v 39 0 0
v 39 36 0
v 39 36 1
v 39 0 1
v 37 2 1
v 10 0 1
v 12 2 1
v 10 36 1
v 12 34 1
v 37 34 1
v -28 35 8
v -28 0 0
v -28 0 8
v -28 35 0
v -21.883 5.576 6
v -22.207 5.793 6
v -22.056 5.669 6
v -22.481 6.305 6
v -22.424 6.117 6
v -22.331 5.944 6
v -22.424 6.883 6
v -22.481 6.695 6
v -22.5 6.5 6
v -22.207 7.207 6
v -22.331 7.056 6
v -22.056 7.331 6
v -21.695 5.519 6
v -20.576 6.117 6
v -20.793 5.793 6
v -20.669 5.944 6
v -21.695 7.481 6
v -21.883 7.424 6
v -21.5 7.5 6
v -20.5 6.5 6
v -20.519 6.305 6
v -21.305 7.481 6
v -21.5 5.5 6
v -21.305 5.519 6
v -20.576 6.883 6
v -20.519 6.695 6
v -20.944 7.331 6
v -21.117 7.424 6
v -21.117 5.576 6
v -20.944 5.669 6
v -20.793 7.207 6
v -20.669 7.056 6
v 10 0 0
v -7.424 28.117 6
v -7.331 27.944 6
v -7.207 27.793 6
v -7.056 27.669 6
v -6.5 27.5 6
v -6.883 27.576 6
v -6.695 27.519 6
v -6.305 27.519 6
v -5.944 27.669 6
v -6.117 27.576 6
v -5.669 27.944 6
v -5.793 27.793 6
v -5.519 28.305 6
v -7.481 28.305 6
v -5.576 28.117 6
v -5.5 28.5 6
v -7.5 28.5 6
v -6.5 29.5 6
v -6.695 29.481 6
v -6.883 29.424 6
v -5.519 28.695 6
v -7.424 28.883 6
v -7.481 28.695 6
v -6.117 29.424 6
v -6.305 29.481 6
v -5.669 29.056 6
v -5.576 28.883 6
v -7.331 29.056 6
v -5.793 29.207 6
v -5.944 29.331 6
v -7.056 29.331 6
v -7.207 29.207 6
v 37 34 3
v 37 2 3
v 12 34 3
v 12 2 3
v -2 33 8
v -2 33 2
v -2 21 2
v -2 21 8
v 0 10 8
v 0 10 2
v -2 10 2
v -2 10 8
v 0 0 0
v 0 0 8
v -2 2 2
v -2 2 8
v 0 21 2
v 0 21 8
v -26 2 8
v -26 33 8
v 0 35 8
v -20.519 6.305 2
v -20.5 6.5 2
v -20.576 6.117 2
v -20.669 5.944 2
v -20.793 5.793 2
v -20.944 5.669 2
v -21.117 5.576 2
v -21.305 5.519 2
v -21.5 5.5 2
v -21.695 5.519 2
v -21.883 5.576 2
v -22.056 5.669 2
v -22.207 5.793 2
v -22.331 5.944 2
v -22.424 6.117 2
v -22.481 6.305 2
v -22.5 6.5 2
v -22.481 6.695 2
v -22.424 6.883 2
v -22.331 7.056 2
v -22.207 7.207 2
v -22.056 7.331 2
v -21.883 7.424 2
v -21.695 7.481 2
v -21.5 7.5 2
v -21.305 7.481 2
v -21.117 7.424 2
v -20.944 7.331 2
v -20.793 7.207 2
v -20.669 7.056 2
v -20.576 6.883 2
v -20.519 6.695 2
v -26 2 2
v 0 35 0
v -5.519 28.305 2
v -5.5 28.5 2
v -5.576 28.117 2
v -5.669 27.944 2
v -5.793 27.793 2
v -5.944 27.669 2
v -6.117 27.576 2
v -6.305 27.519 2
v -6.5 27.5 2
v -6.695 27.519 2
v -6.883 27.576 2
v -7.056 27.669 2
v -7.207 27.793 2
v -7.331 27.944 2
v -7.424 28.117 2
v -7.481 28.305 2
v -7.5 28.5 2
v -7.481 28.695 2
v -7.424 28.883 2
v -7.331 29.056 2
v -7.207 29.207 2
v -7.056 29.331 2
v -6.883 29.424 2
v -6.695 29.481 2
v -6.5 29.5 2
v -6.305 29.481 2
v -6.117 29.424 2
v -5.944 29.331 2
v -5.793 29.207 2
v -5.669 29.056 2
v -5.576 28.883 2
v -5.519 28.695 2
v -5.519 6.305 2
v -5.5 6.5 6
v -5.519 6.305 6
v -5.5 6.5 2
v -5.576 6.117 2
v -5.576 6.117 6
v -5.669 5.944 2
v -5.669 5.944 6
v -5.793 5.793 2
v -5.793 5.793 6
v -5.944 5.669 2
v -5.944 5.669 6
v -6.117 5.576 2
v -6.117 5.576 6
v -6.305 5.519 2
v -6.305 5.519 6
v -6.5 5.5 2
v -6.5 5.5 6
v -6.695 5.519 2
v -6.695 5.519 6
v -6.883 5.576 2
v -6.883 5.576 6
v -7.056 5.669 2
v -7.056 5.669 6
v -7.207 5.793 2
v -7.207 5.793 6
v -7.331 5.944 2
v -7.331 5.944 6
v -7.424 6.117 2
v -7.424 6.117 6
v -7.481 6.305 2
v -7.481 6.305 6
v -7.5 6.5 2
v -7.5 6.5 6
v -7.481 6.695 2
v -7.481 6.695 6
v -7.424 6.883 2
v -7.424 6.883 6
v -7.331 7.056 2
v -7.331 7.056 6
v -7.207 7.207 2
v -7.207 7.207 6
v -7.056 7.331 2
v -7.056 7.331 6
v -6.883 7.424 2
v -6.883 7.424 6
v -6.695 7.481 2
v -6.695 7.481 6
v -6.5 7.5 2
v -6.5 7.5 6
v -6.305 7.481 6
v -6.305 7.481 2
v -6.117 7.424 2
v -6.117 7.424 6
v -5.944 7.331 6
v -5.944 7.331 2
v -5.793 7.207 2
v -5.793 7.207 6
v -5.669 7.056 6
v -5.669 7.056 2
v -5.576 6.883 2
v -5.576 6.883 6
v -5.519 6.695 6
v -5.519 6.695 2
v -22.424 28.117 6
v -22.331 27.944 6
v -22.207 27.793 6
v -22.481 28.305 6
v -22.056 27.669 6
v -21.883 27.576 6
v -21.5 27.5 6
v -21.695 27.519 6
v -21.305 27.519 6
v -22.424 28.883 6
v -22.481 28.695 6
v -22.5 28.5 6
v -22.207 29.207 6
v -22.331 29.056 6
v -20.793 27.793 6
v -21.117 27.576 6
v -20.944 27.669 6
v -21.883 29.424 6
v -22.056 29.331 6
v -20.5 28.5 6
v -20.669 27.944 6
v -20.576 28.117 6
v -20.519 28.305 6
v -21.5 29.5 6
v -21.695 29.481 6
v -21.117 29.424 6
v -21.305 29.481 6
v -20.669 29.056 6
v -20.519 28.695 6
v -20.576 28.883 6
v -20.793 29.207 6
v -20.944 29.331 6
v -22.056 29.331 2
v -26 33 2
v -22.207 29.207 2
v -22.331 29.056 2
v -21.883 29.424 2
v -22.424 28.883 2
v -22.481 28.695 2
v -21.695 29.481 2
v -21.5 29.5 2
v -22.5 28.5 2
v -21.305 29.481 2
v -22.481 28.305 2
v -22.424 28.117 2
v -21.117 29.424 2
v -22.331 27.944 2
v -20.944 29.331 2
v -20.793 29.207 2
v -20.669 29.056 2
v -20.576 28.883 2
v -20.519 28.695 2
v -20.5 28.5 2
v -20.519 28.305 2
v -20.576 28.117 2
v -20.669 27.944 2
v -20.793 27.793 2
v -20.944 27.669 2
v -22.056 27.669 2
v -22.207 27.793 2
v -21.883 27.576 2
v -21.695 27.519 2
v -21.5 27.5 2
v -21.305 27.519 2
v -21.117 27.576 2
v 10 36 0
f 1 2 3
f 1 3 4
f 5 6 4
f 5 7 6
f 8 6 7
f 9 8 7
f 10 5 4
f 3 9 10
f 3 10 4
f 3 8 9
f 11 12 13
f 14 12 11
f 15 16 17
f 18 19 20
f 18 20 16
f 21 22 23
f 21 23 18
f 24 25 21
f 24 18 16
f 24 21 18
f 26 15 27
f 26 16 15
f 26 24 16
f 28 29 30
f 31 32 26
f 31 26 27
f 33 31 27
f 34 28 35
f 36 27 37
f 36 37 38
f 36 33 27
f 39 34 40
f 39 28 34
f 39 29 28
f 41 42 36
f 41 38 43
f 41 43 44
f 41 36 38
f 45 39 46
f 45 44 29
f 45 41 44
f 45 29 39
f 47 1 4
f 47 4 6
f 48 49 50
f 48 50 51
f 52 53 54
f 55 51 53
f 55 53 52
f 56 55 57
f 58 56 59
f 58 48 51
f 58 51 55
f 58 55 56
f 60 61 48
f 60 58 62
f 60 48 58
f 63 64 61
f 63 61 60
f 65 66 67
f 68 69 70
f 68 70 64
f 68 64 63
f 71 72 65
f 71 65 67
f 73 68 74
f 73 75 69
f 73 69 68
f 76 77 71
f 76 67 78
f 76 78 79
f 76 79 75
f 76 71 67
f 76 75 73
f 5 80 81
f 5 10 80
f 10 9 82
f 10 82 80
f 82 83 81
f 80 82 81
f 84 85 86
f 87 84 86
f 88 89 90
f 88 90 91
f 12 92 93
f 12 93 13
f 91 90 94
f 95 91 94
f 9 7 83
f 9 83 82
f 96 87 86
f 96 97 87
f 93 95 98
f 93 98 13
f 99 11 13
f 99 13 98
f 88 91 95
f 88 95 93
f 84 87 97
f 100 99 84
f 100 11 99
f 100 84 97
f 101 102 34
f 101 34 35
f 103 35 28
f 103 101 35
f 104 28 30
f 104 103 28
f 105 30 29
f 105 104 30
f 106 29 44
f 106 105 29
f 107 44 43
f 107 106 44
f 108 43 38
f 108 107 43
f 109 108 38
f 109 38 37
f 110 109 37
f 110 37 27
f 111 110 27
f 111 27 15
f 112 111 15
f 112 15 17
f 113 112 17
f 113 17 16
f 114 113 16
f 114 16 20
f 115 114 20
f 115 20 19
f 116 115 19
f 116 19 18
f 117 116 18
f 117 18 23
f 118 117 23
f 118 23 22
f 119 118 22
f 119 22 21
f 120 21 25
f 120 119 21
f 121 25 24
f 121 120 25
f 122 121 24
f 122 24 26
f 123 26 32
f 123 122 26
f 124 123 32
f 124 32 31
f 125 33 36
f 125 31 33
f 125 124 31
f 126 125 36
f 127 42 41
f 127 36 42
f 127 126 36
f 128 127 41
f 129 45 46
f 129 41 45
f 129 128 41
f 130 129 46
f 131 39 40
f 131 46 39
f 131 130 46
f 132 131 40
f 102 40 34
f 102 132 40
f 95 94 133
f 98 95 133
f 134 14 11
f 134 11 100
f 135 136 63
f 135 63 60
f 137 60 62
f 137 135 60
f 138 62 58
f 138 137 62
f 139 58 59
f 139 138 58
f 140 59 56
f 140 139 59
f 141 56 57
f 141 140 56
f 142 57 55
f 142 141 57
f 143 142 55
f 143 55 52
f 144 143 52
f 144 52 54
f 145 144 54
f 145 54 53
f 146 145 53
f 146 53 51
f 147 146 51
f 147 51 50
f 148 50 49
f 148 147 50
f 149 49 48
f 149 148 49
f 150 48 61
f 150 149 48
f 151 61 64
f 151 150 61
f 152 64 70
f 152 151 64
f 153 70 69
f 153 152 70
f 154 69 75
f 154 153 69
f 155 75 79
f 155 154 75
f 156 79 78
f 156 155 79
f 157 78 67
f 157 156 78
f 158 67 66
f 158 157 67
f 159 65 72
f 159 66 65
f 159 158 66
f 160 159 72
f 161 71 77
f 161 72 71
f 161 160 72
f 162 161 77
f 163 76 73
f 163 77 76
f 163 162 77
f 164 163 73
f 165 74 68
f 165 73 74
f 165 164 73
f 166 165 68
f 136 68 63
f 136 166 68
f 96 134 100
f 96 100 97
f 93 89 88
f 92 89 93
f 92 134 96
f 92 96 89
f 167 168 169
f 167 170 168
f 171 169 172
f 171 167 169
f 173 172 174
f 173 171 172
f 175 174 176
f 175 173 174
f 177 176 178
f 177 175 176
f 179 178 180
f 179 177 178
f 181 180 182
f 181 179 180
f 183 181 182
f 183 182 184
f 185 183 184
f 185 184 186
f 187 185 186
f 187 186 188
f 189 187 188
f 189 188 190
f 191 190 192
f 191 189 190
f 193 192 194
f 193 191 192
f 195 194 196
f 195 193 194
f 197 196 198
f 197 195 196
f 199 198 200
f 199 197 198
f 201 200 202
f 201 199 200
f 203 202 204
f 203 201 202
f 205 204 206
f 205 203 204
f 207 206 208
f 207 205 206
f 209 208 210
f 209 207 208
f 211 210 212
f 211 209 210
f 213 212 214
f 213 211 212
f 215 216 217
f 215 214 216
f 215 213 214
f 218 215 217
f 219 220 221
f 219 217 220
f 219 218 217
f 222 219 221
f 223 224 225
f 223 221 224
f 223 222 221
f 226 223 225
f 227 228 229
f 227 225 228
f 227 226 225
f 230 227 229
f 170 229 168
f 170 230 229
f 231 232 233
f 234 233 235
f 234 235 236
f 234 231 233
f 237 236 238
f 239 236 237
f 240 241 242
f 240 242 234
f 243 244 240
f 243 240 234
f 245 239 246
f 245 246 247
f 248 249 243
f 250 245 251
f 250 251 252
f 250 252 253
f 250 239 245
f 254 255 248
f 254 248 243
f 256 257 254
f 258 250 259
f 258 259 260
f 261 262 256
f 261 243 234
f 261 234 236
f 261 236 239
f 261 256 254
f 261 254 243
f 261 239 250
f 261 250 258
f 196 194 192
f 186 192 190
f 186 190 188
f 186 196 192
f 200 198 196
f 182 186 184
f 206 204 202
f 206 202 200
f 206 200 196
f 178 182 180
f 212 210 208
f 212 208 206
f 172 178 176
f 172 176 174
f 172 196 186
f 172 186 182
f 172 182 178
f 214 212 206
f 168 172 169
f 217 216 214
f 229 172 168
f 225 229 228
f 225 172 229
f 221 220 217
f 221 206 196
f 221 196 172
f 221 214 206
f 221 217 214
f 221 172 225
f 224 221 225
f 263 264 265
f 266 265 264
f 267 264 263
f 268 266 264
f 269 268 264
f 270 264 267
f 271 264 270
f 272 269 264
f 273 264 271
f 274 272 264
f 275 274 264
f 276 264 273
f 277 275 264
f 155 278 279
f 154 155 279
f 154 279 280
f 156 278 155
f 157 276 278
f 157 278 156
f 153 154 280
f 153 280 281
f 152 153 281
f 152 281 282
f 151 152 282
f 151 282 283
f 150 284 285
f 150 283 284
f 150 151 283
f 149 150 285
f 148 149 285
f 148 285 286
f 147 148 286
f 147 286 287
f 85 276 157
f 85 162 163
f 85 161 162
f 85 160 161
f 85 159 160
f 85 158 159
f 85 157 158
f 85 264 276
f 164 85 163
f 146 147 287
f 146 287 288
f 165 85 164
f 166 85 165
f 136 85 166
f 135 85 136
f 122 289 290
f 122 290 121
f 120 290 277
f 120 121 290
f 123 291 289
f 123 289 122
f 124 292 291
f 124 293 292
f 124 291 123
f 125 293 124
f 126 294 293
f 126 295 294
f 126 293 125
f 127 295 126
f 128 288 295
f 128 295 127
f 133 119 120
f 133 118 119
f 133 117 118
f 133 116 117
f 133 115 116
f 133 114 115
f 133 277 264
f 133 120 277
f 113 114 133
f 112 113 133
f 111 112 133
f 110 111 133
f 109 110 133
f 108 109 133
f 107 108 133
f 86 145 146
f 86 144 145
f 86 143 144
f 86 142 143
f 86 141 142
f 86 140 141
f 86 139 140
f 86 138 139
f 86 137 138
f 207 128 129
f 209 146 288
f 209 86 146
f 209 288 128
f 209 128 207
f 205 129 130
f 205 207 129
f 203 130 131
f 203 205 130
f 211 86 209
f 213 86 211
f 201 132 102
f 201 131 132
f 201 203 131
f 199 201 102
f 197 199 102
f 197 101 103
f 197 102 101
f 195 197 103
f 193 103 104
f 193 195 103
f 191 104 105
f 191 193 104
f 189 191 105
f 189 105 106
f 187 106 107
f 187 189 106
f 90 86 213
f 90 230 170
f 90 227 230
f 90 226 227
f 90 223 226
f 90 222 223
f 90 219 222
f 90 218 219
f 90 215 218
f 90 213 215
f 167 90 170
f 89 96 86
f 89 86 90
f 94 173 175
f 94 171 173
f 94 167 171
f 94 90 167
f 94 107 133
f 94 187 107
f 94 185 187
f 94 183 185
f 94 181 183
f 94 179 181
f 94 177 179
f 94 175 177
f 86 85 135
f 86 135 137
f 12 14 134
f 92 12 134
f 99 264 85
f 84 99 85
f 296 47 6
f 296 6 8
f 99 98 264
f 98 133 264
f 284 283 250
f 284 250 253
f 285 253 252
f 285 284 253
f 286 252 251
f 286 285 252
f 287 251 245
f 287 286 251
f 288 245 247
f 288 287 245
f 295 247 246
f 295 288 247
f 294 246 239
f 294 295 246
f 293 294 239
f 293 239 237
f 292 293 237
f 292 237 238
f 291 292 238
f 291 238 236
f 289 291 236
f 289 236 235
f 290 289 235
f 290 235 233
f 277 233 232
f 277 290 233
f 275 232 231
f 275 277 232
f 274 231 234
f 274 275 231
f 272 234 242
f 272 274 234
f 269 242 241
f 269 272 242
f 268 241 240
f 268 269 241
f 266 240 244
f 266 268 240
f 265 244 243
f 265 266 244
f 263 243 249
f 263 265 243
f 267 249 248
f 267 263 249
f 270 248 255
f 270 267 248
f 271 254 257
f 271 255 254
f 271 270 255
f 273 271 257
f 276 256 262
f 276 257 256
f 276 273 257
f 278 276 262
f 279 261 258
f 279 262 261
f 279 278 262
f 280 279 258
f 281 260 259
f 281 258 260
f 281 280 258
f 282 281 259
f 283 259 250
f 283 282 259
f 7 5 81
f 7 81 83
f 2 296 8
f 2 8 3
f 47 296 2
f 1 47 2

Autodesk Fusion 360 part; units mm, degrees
sketch "Sketch1" plane through (0, 0, 0) normal (0, 0, 1) x (1, 0, 0)
  line L0 (-28, 35) -> (0, 35)
  line L1 (0, 35) -> (0, 0)
  line L2 (0, 0) -> (-28, 0)
  line L3 (-28, 0) -> (-28, 35)
  circle A0 centre (-21.5, 28.5) radius 1
  circle A1 centre (-6.5, 28.5) radius 1
  circle A2 centre (-21.5, 6.5) radius 1
  circle A3 centre (-6.5, 6.5) radius 1
  line L4 (-32, 28.5) -> (12, 28.5) construction
  line L5 (-6.5, 33) -> (-6.5, -2) construction
  line L6 (-28, 6.5) -> (6, 6.5) construction
  line L7 (-21.5, 33) -> (-21.5, -2) construction
  line L8 (-26, 33) -> (-2, 33)
  line L9 (-2, 33) -> (-2, 2)
  line L10 (-2, 2) -> (-26, 2)
  line L11 (-26, 2) -> (-26, 33)
  point P0 (-21.5, 25)
  dimension "d1" = 35
  dimension "d2" = 28
  dimension "d3" = 2
  dimension "d4" = 15
  dimension "d5" = 22
  dimension "d7" = 6.5
  dimension "d8" = 6.5
  dimension "d13" = 2
  dimension "d14" = 2
  dimension "d15" = 2
  dimension "d16" = 2
extrude "Extrude1" add sketch "Sketch1" along normal blind 2 contours L0 L1 L2 L3 | L8 L9 L10 L11 makes body 1
extrude "Extrude2" add sketch "Sketch1" along normal blind 6 contours A0 | A1 | A2 | A3 bodies 1
extrude "Extrude3" cut sketch "Sketch1" along normal blind 8 contours L0 L1 L2 L3 bodies 1
extrude "Extrude4" add sketch "Sketch1" along normal blind 8 contours L0 L1 L2 L3 bodies 1
sketch "Sketch3" plane through (0, 0, 0) normal (0, 0, 1) x (1, 0, 0)
  line L0 (10, 36) -> (39, 36)
  line L1 (39, 36) -> (39, 0)
  line L2 (39, 0) -> (10, 0)
  line L3 (10, 0) -> (10, 36)
  line L4 (12, 34) -> (37, 34)
  line L5 (37, 34) -> (37, 2)
  line L6 (37, 2) -> (12, 2)
  line L7 (12, 2) -> (12, 34)
  line L8 (-40, 0) -> (50, 0) construction
  point P0 (-28, 0)
  dimension "d21" = 29
  dimension "d22" = 36
  dimension "d23" = 2
  dimension "d24" = 2
  dimension "d25" = 2
  dimension "d26" = 2
extrude "Extrude5" add sketch "Sketch3" along normal blind 1 separate body makes body 2
extrude "Extrude6" add sketch "Sketch3" along normal blind 3 contours L4 L5 L6 L7 bodies 2
sketch "Sketch4" plane through (0, 0, 0) normal (1, 0, 0) x (0, 1, 0)
  line L0 (0, 0) -> (35, 0)
  line L1 (35, 0) -> (35, 8)
  line L2 (35, 8) -> (0, 8)
  line L3 (0, 8) -> (0, 0)
  line L4 (10, 8) -> (21, 8)
  line L5 (21, 8) -> (21, 2)
  line L6 (21, 2) -> (10, 2)
  line L7 (10, 2) -> (10, 8)
  dimension "d31" = 6
  dimension "d32" = 11
  dimension "d33" = 10
extrude "Extrude7" cut sketch "Sketch4" against normal blind 3 contours L2 L4 L5 L6 L7 bodies 1
equation "d7 = ( d1 - d5 ) / 2"
equation "d8 = ( d2 - d4 ) / 2"
